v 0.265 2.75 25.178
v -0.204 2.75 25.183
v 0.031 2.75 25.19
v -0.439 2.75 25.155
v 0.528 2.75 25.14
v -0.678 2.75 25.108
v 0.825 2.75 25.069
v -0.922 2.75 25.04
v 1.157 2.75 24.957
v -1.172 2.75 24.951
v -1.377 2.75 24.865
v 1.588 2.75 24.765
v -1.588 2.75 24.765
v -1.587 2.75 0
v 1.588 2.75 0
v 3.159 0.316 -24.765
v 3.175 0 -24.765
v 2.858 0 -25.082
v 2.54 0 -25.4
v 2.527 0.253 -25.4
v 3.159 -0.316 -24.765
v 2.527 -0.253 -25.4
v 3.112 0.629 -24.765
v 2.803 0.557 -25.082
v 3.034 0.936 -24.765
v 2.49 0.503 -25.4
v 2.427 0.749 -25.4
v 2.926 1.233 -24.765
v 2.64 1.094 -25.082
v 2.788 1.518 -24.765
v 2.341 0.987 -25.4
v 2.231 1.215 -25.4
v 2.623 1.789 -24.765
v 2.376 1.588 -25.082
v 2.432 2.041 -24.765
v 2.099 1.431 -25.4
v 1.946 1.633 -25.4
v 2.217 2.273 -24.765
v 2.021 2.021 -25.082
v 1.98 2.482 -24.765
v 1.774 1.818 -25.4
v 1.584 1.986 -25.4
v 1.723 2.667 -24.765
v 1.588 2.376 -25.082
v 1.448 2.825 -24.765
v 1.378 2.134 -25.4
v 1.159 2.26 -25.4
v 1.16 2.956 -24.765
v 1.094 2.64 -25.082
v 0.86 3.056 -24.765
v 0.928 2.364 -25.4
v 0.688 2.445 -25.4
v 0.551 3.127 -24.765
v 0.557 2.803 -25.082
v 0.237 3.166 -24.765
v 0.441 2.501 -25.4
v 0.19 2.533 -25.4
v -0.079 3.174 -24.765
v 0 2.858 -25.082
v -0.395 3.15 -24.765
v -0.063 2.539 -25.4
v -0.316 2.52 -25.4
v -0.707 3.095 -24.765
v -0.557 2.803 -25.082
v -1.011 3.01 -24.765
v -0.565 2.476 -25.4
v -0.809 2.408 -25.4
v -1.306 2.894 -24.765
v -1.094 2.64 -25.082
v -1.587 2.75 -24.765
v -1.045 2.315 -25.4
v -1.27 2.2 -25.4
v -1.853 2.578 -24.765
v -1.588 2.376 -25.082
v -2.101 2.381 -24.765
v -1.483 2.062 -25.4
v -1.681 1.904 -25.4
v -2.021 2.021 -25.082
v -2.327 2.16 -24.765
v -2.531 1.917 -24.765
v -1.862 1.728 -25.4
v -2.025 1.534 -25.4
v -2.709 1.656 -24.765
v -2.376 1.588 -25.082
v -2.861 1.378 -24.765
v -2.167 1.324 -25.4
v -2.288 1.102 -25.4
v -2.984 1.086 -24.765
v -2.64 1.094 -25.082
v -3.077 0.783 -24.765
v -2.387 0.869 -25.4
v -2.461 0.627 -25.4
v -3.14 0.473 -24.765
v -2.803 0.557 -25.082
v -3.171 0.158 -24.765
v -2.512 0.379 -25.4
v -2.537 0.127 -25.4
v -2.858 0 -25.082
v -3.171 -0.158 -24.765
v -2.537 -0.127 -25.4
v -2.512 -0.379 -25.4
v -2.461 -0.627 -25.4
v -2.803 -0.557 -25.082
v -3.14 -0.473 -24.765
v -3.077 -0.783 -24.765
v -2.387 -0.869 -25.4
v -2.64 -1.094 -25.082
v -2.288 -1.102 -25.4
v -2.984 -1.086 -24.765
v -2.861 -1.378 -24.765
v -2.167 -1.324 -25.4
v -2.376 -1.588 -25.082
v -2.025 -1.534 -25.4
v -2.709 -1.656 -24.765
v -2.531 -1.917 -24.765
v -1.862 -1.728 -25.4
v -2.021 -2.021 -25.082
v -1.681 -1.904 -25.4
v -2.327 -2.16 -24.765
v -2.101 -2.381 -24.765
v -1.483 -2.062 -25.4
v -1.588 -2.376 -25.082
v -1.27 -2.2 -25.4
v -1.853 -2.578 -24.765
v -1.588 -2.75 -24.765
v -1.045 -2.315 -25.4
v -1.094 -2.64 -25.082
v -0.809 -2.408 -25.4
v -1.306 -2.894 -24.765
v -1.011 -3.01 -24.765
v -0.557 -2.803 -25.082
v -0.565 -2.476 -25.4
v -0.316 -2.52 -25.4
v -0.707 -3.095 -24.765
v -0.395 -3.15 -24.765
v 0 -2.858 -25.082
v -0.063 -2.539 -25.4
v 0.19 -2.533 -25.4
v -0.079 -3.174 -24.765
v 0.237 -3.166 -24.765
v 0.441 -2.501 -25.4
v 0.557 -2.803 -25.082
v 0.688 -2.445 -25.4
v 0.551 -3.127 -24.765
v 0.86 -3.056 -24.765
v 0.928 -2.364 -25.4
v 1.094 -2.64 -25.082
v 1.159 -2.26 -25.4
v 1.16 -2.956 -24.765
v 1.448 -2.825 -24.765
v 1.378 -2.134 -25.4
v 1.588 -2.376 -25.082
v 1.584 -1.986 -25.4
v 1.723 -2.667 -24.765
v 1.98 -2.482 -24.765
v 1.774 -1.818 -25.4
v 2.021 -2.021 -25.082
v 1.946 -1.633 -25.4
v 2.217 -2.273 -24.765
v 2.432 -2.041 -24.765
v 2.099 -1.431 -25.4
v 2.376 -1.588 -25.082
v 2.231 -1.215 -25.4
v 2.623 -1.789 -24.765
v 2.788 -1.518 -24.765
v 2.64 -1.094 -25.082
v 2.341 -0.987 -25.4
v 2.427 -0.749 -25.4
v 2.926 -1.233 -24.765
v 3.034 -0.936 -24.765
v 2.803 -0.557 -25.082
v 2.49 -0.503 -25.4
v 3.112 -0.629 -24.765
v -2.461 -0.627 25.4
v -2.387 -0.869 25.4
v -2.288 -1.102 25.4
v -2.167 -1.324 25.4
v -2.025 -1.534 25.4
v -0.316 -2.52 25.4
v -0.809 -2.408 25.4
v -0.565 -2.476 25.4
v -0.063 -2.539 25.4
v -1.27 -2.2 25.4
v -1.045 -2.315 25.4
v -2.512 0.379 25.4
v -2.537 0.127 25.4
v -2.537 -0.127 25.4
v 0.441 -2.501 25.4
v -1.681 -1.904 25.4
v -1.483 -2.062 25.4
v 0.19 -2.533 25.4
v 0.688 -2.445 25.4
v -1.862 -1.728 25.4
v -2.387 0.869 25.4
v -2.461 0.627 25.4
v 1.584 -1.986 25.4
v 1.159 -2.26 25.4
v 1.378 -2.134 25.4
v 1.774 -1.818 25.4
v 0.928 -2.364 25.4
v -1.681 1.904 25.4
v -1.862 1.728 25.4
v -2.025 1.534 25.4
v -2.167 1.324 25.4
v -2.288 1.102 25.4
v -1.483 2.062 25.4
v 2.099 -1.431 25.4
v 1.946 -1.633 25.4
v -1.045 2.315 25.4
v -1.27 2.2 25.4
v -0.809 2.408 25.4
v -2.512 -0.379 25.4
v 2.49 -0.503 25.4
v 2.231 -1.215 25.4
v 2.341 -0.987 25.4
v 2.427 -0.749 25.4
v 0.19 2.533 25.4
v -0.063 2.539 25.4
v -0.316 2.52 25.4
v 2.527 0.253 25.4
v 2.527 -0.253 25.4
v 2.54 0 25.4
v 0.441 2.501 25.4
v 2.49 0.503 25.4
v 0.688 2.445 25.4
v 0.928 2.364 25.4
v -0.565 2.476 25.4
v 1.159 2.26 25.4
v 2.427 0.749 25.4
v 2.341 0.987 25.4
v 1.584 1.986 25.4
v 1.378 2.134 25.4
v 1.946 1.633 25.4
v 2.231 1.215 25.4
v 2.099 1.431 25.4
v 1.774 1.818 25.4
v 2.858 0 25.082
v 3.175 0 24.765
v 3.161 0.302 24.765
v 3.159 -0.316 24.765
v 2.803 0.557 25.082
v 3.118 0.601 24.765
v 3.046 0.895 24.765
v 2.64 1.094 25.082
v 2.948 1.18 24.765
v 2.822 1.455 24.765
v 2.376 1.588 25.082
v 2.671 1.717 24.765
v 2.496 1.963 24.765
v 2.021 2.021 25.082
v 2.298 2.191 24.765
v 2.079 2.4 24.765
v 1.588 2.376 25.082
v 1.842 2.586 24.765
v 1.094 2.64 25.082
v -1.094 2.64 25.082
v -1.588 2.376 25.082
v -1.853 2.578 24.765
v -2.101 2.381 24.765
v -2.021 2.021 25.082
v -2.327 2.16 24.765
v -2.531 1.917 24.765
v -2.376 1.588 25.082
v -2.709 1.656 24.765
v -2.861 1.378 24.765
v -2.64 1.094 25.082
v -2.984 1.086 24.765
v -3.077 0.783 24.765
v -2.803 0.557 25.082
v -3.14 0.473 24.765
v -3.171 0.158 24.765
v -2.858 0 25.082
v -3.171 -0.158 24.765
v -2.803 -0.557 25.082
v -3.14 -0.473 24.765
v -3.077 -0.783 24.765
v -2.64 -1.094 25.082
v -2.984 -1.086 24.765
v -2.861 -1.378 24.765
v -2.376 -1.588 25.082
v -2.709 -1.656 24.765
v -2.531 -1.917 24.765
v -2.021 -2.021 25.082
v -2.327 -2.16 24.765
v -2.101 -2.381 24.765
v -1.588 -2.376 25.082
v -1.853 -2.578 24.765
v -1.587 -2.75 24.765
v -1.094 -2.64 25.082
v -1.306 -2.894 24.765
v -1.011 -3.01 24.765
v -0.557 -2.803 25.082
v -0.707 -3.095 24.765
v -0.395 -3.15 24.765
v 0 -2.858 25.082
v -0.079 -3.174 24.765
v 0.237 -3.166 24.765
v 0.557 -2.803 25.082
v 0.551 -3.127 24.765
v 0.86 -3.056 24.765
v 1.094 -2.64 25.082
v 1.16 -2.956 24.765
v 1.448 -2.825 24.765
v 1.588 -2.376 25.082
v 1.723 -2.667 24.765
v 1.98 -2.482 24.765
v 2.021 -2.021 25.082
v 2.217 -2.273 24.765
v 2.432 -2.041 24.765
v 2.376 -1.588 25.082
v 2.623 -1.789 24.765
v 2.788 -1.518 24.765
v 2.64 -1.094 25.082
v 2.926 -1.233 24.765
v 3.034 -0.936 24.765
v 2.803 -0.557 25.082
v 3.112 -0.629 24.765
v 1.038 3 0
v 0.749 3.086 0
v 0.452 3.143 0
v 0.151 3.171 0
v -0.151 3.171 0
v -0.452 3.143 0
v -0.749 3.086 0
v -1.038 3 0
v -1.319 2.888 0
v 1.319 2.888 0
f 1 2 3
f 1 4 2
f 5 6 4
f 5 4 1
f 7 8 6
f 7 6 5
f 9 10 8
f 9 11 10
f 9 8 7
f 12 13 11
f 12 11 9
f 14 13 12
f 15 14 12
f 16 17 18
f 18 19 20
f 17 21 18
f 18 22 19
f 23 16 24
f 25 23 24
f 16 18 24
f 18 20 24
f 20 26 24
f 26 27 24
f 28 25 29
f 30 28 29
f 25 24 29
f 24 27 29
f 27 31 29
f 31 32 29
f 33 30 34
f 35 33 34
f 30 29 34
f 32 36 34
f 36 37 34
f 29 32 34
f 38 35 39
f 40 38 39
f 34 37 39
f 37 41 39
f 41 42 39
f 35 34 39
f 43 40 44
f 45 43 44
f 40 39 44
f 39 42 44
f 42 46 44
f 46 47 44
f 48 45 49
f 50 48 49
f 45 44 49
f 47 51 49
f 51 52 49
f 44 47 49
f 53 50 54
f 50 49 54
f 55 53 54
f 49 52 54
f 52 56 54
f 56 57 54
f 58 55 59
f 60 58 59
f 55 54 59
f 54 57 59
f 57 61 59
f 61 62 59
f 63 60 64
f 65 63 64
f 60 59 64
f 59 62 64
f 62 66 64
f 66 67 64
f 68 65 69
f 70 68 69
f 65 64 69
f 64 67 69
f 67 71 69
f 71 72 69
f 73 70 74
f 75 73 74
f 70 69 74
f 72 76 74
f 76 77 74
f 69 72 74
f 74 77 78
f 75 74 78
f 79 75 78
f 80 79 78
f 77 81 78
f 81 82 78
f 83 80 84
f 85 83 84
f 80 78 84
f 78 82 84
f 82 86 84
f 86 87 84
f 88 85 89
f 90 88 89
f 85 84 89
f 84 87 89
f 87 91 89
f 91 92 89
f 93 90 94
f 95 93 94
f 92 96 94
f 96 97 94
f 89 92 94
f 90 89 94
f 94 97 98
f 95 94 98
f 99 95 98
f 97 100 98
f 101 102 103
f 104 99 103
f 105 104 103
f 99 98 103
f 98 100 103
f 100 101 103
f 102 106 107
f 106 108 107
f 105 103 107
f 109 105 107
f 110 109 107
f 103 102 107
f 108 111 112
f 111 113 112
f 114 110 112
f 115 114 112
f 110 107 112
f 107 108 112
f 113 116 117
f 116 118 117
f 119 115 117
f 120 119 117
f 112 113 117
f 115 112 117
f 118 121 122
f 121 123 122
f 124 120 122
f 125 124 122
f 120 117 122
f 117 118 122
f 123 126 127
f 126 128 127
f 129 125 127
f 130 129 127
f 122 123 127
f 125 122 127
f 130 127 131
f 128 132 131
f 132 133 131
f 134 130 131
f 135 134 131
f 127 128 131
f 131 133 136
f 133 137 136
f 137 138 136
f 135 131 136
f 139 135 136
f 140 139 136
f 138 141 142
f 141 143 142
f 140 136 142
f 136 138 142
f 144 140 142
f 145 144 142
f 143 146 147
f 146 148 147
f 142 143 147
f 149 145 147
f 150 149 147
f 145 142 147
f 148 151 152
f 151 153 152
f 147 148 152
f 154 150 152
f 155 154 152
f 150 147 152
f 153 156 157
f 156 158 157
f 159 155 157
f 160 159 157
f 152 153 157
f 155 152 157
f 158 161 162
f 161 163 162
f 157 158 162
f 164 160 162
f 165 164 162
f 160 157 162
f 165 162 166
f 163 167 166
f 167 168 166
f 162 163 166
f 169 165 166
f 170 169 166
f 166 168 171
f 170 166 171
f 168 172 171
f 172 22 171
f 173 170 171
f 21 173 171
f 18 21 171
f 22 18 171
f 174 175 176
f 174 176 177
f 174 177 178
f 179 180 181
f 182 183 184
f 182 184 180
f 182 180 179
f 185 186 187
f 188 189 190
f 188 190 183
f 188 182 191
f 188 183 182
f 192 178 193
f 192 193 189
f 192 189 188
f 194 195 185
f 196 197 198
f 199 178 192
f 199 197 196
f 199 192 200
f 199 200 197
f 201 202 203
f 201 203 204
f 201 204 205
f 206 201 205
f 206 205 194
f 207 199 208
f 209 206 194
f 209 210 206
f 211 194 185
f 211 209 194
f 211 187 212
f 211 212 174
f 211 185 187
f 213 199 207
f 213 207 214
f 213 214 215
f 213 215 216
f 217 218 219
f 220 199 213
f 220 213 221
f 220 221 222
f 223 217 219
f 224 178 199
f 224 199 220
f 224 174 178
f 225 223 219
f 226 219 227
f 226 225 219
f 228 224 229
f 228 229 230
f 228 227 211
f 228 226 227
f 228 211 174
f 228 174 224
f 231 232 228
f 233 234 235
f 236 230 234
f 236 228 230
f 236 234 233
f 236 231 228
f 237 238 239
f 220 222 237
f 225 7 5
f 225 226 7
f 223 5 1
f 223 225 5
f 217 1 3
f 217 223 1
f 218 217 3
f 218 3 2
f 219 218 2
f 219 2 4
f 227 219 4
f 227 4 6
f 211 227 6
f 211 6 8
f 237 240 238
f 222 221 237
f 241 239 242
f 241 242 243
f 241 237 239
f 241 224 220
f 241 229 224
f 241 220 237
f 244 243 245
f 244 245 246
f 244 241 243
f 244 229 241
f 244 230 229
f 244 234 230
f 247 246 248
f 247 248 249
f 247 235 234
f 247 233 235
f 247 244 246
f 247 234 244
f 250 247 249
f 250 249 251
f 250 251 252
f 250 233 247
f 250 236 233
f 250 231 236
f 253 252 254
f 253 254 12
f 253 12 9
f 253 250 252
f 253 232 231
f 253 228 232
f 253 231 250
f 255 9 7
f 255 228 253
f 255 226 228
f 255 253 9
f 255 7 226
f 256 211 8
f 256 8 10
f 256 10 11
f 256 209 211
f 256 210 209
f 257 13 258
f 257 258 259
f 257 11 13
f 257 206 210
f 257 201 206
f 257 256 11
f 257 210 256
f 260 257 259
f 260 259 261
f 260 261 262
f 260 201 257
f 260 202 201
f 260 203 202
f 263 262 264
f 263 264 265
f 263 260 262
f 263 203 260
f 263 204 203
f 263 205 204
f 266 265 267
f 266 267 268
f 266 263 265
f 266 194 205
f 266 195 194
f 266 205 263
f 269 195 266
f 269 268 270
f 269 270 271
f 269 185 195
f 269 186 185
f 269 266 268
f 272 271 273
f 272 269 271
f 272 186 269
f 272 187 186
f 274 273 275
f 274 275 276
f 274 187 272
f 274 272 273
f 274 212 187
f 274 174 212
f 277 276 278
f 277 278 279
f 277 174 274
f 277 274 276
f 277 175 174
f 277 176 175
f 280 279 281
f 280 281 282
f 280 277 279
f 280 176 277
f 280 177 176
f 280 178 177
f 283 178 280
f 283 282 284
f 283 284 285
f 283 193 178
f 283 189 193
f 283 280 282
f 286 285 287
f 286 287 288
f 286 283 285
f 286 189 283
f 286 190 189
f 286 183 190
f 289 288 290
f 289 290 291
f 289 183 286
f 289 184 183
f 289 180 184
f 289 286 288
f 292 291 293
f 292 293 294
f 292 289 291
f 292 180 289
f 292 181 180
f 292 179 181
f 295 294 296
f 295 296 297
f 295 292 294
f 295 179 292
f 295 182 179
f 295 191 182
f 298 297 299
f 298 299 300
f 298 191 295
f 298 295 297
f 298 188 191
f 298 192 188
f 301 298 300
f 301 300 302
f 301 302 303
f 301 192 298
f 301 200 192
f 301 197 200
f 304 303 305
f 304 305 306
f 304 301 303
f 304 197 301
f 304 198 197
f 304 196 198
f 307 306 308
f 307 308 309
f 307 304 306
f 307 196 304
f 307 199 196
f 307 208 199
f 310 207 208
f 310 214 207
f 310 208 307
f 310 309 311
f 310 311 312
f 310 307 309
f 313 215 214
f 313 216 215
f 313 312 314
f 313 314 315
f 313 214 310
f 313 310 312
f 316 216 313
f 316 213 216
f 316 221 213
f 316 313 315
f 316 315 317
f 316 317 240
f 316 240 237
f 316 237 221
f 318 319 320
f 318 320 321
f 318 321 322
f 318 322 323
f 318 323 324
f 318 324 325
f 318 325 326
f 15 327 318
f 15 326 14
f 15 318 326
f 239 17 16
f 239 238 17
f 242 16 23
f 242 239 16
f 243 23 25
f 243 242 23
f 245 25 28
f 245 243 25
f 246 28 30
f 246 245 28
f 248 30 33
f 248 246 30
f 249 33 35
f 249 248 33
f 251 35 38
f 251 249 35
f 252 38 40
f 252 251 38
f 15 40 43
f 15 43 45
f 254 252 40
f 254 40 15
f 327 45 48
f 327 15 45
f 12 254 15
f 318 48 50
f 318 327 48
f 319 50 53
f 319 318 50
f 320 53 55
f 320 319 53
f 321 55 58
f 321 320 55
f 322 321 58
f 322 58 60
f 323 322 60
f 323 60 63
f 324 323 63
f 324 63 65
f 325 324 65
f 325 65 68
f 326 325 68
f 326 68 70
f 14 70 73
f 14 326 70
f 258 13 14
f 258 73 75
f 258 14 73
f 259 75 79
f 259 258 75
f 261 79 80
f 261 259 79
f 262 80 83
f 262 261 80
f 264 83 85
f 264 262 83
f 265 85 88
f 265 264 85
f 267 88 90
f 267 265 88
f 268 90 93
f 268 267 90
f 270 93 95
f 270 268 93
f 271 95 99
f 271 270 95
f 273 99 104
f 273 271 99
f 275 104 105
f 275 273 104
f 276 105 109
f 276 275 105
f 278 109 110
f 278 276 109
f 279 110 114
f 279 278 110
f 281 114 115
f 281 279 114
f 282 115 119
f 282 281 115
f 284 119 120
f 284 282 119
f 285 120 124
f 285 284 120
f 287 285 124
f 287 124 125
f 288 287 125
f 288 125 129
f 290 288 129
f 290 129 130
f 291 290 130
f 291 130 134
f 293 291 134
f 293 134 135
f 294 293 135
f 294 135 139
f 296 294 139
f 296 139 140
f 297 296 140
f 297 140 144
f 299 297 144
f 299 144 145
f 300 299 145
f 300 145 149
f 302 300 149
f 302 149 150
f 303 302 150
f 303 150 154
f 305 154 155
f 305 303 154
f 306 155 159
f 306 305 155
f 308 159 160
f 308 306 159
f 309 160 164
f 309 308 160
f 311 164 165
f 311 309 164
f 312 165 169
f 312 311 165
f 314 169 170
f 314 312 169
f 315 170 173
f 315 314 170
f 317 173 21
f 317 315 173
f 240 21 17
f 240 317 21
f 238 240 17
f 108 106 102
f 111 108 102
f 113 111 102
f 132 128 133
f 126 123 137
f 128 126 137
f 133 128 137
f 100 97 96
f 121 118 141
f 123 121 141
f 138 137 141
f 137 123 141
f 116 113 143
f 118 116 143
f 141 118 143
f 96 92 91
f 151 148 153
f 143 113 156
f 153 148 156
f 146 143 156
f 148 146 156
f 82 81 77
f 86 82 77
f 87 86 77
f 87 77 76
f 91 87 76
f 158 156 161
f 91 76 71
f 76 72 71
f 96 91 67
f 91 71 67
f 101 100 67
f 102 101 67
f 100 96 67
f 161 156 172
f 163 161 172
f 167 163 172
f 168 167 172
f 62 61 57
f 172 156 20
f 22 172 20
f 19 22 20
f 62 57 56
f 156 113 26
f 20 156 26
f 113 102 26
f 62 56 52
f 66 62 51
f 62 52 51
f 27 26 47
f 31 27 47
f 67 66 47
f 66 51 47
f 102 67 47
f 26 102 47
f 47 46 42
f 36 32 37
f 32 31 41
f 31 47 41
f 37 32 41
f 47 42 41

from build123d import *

# Parameters (mm, degrees)
SKETCH1_R      = 3.175
EXTRUDE1_DEPTH = 25.4
CHAMFER1_SIZE  = 0.635
EXTRUDE7_DEPTH = 26.4


with BuildPart() as part:
    # Sketch1 → Extrude1 (new body, symmetric)
    with BuildSketch(Plane.XY):
        Circle(SKETCH1_R)
    extrude(amount=EXTRUDE1_DEPTH, both=True)

    # Chamfer1
    chamfer1_edges = [part.edges().sort_by_distance(p)[0] for p in [
        (-3.175, 0, -25.4),
        (-3.175, 0, 25.4),
    ]]
    chamfer(chamfer1_edges, length=CHAMFER1_SIZE)

    # Sketch13 → Extrude7 (cut, through all)
    with BuildSketch(Plane.XY):
        with BuildLine():
            Line((-1.5875, 2.749630657), (1.5875, 2.749630657))
            ThreePointArc((1.5875, 2.749630657), (0, 3.175), (-1.5875, 2.749630657))
        make_face()
    extrude(amount=EXTRUDE7_DEPTH, mode=Mode.SUBTRACT)


solid = part.part
